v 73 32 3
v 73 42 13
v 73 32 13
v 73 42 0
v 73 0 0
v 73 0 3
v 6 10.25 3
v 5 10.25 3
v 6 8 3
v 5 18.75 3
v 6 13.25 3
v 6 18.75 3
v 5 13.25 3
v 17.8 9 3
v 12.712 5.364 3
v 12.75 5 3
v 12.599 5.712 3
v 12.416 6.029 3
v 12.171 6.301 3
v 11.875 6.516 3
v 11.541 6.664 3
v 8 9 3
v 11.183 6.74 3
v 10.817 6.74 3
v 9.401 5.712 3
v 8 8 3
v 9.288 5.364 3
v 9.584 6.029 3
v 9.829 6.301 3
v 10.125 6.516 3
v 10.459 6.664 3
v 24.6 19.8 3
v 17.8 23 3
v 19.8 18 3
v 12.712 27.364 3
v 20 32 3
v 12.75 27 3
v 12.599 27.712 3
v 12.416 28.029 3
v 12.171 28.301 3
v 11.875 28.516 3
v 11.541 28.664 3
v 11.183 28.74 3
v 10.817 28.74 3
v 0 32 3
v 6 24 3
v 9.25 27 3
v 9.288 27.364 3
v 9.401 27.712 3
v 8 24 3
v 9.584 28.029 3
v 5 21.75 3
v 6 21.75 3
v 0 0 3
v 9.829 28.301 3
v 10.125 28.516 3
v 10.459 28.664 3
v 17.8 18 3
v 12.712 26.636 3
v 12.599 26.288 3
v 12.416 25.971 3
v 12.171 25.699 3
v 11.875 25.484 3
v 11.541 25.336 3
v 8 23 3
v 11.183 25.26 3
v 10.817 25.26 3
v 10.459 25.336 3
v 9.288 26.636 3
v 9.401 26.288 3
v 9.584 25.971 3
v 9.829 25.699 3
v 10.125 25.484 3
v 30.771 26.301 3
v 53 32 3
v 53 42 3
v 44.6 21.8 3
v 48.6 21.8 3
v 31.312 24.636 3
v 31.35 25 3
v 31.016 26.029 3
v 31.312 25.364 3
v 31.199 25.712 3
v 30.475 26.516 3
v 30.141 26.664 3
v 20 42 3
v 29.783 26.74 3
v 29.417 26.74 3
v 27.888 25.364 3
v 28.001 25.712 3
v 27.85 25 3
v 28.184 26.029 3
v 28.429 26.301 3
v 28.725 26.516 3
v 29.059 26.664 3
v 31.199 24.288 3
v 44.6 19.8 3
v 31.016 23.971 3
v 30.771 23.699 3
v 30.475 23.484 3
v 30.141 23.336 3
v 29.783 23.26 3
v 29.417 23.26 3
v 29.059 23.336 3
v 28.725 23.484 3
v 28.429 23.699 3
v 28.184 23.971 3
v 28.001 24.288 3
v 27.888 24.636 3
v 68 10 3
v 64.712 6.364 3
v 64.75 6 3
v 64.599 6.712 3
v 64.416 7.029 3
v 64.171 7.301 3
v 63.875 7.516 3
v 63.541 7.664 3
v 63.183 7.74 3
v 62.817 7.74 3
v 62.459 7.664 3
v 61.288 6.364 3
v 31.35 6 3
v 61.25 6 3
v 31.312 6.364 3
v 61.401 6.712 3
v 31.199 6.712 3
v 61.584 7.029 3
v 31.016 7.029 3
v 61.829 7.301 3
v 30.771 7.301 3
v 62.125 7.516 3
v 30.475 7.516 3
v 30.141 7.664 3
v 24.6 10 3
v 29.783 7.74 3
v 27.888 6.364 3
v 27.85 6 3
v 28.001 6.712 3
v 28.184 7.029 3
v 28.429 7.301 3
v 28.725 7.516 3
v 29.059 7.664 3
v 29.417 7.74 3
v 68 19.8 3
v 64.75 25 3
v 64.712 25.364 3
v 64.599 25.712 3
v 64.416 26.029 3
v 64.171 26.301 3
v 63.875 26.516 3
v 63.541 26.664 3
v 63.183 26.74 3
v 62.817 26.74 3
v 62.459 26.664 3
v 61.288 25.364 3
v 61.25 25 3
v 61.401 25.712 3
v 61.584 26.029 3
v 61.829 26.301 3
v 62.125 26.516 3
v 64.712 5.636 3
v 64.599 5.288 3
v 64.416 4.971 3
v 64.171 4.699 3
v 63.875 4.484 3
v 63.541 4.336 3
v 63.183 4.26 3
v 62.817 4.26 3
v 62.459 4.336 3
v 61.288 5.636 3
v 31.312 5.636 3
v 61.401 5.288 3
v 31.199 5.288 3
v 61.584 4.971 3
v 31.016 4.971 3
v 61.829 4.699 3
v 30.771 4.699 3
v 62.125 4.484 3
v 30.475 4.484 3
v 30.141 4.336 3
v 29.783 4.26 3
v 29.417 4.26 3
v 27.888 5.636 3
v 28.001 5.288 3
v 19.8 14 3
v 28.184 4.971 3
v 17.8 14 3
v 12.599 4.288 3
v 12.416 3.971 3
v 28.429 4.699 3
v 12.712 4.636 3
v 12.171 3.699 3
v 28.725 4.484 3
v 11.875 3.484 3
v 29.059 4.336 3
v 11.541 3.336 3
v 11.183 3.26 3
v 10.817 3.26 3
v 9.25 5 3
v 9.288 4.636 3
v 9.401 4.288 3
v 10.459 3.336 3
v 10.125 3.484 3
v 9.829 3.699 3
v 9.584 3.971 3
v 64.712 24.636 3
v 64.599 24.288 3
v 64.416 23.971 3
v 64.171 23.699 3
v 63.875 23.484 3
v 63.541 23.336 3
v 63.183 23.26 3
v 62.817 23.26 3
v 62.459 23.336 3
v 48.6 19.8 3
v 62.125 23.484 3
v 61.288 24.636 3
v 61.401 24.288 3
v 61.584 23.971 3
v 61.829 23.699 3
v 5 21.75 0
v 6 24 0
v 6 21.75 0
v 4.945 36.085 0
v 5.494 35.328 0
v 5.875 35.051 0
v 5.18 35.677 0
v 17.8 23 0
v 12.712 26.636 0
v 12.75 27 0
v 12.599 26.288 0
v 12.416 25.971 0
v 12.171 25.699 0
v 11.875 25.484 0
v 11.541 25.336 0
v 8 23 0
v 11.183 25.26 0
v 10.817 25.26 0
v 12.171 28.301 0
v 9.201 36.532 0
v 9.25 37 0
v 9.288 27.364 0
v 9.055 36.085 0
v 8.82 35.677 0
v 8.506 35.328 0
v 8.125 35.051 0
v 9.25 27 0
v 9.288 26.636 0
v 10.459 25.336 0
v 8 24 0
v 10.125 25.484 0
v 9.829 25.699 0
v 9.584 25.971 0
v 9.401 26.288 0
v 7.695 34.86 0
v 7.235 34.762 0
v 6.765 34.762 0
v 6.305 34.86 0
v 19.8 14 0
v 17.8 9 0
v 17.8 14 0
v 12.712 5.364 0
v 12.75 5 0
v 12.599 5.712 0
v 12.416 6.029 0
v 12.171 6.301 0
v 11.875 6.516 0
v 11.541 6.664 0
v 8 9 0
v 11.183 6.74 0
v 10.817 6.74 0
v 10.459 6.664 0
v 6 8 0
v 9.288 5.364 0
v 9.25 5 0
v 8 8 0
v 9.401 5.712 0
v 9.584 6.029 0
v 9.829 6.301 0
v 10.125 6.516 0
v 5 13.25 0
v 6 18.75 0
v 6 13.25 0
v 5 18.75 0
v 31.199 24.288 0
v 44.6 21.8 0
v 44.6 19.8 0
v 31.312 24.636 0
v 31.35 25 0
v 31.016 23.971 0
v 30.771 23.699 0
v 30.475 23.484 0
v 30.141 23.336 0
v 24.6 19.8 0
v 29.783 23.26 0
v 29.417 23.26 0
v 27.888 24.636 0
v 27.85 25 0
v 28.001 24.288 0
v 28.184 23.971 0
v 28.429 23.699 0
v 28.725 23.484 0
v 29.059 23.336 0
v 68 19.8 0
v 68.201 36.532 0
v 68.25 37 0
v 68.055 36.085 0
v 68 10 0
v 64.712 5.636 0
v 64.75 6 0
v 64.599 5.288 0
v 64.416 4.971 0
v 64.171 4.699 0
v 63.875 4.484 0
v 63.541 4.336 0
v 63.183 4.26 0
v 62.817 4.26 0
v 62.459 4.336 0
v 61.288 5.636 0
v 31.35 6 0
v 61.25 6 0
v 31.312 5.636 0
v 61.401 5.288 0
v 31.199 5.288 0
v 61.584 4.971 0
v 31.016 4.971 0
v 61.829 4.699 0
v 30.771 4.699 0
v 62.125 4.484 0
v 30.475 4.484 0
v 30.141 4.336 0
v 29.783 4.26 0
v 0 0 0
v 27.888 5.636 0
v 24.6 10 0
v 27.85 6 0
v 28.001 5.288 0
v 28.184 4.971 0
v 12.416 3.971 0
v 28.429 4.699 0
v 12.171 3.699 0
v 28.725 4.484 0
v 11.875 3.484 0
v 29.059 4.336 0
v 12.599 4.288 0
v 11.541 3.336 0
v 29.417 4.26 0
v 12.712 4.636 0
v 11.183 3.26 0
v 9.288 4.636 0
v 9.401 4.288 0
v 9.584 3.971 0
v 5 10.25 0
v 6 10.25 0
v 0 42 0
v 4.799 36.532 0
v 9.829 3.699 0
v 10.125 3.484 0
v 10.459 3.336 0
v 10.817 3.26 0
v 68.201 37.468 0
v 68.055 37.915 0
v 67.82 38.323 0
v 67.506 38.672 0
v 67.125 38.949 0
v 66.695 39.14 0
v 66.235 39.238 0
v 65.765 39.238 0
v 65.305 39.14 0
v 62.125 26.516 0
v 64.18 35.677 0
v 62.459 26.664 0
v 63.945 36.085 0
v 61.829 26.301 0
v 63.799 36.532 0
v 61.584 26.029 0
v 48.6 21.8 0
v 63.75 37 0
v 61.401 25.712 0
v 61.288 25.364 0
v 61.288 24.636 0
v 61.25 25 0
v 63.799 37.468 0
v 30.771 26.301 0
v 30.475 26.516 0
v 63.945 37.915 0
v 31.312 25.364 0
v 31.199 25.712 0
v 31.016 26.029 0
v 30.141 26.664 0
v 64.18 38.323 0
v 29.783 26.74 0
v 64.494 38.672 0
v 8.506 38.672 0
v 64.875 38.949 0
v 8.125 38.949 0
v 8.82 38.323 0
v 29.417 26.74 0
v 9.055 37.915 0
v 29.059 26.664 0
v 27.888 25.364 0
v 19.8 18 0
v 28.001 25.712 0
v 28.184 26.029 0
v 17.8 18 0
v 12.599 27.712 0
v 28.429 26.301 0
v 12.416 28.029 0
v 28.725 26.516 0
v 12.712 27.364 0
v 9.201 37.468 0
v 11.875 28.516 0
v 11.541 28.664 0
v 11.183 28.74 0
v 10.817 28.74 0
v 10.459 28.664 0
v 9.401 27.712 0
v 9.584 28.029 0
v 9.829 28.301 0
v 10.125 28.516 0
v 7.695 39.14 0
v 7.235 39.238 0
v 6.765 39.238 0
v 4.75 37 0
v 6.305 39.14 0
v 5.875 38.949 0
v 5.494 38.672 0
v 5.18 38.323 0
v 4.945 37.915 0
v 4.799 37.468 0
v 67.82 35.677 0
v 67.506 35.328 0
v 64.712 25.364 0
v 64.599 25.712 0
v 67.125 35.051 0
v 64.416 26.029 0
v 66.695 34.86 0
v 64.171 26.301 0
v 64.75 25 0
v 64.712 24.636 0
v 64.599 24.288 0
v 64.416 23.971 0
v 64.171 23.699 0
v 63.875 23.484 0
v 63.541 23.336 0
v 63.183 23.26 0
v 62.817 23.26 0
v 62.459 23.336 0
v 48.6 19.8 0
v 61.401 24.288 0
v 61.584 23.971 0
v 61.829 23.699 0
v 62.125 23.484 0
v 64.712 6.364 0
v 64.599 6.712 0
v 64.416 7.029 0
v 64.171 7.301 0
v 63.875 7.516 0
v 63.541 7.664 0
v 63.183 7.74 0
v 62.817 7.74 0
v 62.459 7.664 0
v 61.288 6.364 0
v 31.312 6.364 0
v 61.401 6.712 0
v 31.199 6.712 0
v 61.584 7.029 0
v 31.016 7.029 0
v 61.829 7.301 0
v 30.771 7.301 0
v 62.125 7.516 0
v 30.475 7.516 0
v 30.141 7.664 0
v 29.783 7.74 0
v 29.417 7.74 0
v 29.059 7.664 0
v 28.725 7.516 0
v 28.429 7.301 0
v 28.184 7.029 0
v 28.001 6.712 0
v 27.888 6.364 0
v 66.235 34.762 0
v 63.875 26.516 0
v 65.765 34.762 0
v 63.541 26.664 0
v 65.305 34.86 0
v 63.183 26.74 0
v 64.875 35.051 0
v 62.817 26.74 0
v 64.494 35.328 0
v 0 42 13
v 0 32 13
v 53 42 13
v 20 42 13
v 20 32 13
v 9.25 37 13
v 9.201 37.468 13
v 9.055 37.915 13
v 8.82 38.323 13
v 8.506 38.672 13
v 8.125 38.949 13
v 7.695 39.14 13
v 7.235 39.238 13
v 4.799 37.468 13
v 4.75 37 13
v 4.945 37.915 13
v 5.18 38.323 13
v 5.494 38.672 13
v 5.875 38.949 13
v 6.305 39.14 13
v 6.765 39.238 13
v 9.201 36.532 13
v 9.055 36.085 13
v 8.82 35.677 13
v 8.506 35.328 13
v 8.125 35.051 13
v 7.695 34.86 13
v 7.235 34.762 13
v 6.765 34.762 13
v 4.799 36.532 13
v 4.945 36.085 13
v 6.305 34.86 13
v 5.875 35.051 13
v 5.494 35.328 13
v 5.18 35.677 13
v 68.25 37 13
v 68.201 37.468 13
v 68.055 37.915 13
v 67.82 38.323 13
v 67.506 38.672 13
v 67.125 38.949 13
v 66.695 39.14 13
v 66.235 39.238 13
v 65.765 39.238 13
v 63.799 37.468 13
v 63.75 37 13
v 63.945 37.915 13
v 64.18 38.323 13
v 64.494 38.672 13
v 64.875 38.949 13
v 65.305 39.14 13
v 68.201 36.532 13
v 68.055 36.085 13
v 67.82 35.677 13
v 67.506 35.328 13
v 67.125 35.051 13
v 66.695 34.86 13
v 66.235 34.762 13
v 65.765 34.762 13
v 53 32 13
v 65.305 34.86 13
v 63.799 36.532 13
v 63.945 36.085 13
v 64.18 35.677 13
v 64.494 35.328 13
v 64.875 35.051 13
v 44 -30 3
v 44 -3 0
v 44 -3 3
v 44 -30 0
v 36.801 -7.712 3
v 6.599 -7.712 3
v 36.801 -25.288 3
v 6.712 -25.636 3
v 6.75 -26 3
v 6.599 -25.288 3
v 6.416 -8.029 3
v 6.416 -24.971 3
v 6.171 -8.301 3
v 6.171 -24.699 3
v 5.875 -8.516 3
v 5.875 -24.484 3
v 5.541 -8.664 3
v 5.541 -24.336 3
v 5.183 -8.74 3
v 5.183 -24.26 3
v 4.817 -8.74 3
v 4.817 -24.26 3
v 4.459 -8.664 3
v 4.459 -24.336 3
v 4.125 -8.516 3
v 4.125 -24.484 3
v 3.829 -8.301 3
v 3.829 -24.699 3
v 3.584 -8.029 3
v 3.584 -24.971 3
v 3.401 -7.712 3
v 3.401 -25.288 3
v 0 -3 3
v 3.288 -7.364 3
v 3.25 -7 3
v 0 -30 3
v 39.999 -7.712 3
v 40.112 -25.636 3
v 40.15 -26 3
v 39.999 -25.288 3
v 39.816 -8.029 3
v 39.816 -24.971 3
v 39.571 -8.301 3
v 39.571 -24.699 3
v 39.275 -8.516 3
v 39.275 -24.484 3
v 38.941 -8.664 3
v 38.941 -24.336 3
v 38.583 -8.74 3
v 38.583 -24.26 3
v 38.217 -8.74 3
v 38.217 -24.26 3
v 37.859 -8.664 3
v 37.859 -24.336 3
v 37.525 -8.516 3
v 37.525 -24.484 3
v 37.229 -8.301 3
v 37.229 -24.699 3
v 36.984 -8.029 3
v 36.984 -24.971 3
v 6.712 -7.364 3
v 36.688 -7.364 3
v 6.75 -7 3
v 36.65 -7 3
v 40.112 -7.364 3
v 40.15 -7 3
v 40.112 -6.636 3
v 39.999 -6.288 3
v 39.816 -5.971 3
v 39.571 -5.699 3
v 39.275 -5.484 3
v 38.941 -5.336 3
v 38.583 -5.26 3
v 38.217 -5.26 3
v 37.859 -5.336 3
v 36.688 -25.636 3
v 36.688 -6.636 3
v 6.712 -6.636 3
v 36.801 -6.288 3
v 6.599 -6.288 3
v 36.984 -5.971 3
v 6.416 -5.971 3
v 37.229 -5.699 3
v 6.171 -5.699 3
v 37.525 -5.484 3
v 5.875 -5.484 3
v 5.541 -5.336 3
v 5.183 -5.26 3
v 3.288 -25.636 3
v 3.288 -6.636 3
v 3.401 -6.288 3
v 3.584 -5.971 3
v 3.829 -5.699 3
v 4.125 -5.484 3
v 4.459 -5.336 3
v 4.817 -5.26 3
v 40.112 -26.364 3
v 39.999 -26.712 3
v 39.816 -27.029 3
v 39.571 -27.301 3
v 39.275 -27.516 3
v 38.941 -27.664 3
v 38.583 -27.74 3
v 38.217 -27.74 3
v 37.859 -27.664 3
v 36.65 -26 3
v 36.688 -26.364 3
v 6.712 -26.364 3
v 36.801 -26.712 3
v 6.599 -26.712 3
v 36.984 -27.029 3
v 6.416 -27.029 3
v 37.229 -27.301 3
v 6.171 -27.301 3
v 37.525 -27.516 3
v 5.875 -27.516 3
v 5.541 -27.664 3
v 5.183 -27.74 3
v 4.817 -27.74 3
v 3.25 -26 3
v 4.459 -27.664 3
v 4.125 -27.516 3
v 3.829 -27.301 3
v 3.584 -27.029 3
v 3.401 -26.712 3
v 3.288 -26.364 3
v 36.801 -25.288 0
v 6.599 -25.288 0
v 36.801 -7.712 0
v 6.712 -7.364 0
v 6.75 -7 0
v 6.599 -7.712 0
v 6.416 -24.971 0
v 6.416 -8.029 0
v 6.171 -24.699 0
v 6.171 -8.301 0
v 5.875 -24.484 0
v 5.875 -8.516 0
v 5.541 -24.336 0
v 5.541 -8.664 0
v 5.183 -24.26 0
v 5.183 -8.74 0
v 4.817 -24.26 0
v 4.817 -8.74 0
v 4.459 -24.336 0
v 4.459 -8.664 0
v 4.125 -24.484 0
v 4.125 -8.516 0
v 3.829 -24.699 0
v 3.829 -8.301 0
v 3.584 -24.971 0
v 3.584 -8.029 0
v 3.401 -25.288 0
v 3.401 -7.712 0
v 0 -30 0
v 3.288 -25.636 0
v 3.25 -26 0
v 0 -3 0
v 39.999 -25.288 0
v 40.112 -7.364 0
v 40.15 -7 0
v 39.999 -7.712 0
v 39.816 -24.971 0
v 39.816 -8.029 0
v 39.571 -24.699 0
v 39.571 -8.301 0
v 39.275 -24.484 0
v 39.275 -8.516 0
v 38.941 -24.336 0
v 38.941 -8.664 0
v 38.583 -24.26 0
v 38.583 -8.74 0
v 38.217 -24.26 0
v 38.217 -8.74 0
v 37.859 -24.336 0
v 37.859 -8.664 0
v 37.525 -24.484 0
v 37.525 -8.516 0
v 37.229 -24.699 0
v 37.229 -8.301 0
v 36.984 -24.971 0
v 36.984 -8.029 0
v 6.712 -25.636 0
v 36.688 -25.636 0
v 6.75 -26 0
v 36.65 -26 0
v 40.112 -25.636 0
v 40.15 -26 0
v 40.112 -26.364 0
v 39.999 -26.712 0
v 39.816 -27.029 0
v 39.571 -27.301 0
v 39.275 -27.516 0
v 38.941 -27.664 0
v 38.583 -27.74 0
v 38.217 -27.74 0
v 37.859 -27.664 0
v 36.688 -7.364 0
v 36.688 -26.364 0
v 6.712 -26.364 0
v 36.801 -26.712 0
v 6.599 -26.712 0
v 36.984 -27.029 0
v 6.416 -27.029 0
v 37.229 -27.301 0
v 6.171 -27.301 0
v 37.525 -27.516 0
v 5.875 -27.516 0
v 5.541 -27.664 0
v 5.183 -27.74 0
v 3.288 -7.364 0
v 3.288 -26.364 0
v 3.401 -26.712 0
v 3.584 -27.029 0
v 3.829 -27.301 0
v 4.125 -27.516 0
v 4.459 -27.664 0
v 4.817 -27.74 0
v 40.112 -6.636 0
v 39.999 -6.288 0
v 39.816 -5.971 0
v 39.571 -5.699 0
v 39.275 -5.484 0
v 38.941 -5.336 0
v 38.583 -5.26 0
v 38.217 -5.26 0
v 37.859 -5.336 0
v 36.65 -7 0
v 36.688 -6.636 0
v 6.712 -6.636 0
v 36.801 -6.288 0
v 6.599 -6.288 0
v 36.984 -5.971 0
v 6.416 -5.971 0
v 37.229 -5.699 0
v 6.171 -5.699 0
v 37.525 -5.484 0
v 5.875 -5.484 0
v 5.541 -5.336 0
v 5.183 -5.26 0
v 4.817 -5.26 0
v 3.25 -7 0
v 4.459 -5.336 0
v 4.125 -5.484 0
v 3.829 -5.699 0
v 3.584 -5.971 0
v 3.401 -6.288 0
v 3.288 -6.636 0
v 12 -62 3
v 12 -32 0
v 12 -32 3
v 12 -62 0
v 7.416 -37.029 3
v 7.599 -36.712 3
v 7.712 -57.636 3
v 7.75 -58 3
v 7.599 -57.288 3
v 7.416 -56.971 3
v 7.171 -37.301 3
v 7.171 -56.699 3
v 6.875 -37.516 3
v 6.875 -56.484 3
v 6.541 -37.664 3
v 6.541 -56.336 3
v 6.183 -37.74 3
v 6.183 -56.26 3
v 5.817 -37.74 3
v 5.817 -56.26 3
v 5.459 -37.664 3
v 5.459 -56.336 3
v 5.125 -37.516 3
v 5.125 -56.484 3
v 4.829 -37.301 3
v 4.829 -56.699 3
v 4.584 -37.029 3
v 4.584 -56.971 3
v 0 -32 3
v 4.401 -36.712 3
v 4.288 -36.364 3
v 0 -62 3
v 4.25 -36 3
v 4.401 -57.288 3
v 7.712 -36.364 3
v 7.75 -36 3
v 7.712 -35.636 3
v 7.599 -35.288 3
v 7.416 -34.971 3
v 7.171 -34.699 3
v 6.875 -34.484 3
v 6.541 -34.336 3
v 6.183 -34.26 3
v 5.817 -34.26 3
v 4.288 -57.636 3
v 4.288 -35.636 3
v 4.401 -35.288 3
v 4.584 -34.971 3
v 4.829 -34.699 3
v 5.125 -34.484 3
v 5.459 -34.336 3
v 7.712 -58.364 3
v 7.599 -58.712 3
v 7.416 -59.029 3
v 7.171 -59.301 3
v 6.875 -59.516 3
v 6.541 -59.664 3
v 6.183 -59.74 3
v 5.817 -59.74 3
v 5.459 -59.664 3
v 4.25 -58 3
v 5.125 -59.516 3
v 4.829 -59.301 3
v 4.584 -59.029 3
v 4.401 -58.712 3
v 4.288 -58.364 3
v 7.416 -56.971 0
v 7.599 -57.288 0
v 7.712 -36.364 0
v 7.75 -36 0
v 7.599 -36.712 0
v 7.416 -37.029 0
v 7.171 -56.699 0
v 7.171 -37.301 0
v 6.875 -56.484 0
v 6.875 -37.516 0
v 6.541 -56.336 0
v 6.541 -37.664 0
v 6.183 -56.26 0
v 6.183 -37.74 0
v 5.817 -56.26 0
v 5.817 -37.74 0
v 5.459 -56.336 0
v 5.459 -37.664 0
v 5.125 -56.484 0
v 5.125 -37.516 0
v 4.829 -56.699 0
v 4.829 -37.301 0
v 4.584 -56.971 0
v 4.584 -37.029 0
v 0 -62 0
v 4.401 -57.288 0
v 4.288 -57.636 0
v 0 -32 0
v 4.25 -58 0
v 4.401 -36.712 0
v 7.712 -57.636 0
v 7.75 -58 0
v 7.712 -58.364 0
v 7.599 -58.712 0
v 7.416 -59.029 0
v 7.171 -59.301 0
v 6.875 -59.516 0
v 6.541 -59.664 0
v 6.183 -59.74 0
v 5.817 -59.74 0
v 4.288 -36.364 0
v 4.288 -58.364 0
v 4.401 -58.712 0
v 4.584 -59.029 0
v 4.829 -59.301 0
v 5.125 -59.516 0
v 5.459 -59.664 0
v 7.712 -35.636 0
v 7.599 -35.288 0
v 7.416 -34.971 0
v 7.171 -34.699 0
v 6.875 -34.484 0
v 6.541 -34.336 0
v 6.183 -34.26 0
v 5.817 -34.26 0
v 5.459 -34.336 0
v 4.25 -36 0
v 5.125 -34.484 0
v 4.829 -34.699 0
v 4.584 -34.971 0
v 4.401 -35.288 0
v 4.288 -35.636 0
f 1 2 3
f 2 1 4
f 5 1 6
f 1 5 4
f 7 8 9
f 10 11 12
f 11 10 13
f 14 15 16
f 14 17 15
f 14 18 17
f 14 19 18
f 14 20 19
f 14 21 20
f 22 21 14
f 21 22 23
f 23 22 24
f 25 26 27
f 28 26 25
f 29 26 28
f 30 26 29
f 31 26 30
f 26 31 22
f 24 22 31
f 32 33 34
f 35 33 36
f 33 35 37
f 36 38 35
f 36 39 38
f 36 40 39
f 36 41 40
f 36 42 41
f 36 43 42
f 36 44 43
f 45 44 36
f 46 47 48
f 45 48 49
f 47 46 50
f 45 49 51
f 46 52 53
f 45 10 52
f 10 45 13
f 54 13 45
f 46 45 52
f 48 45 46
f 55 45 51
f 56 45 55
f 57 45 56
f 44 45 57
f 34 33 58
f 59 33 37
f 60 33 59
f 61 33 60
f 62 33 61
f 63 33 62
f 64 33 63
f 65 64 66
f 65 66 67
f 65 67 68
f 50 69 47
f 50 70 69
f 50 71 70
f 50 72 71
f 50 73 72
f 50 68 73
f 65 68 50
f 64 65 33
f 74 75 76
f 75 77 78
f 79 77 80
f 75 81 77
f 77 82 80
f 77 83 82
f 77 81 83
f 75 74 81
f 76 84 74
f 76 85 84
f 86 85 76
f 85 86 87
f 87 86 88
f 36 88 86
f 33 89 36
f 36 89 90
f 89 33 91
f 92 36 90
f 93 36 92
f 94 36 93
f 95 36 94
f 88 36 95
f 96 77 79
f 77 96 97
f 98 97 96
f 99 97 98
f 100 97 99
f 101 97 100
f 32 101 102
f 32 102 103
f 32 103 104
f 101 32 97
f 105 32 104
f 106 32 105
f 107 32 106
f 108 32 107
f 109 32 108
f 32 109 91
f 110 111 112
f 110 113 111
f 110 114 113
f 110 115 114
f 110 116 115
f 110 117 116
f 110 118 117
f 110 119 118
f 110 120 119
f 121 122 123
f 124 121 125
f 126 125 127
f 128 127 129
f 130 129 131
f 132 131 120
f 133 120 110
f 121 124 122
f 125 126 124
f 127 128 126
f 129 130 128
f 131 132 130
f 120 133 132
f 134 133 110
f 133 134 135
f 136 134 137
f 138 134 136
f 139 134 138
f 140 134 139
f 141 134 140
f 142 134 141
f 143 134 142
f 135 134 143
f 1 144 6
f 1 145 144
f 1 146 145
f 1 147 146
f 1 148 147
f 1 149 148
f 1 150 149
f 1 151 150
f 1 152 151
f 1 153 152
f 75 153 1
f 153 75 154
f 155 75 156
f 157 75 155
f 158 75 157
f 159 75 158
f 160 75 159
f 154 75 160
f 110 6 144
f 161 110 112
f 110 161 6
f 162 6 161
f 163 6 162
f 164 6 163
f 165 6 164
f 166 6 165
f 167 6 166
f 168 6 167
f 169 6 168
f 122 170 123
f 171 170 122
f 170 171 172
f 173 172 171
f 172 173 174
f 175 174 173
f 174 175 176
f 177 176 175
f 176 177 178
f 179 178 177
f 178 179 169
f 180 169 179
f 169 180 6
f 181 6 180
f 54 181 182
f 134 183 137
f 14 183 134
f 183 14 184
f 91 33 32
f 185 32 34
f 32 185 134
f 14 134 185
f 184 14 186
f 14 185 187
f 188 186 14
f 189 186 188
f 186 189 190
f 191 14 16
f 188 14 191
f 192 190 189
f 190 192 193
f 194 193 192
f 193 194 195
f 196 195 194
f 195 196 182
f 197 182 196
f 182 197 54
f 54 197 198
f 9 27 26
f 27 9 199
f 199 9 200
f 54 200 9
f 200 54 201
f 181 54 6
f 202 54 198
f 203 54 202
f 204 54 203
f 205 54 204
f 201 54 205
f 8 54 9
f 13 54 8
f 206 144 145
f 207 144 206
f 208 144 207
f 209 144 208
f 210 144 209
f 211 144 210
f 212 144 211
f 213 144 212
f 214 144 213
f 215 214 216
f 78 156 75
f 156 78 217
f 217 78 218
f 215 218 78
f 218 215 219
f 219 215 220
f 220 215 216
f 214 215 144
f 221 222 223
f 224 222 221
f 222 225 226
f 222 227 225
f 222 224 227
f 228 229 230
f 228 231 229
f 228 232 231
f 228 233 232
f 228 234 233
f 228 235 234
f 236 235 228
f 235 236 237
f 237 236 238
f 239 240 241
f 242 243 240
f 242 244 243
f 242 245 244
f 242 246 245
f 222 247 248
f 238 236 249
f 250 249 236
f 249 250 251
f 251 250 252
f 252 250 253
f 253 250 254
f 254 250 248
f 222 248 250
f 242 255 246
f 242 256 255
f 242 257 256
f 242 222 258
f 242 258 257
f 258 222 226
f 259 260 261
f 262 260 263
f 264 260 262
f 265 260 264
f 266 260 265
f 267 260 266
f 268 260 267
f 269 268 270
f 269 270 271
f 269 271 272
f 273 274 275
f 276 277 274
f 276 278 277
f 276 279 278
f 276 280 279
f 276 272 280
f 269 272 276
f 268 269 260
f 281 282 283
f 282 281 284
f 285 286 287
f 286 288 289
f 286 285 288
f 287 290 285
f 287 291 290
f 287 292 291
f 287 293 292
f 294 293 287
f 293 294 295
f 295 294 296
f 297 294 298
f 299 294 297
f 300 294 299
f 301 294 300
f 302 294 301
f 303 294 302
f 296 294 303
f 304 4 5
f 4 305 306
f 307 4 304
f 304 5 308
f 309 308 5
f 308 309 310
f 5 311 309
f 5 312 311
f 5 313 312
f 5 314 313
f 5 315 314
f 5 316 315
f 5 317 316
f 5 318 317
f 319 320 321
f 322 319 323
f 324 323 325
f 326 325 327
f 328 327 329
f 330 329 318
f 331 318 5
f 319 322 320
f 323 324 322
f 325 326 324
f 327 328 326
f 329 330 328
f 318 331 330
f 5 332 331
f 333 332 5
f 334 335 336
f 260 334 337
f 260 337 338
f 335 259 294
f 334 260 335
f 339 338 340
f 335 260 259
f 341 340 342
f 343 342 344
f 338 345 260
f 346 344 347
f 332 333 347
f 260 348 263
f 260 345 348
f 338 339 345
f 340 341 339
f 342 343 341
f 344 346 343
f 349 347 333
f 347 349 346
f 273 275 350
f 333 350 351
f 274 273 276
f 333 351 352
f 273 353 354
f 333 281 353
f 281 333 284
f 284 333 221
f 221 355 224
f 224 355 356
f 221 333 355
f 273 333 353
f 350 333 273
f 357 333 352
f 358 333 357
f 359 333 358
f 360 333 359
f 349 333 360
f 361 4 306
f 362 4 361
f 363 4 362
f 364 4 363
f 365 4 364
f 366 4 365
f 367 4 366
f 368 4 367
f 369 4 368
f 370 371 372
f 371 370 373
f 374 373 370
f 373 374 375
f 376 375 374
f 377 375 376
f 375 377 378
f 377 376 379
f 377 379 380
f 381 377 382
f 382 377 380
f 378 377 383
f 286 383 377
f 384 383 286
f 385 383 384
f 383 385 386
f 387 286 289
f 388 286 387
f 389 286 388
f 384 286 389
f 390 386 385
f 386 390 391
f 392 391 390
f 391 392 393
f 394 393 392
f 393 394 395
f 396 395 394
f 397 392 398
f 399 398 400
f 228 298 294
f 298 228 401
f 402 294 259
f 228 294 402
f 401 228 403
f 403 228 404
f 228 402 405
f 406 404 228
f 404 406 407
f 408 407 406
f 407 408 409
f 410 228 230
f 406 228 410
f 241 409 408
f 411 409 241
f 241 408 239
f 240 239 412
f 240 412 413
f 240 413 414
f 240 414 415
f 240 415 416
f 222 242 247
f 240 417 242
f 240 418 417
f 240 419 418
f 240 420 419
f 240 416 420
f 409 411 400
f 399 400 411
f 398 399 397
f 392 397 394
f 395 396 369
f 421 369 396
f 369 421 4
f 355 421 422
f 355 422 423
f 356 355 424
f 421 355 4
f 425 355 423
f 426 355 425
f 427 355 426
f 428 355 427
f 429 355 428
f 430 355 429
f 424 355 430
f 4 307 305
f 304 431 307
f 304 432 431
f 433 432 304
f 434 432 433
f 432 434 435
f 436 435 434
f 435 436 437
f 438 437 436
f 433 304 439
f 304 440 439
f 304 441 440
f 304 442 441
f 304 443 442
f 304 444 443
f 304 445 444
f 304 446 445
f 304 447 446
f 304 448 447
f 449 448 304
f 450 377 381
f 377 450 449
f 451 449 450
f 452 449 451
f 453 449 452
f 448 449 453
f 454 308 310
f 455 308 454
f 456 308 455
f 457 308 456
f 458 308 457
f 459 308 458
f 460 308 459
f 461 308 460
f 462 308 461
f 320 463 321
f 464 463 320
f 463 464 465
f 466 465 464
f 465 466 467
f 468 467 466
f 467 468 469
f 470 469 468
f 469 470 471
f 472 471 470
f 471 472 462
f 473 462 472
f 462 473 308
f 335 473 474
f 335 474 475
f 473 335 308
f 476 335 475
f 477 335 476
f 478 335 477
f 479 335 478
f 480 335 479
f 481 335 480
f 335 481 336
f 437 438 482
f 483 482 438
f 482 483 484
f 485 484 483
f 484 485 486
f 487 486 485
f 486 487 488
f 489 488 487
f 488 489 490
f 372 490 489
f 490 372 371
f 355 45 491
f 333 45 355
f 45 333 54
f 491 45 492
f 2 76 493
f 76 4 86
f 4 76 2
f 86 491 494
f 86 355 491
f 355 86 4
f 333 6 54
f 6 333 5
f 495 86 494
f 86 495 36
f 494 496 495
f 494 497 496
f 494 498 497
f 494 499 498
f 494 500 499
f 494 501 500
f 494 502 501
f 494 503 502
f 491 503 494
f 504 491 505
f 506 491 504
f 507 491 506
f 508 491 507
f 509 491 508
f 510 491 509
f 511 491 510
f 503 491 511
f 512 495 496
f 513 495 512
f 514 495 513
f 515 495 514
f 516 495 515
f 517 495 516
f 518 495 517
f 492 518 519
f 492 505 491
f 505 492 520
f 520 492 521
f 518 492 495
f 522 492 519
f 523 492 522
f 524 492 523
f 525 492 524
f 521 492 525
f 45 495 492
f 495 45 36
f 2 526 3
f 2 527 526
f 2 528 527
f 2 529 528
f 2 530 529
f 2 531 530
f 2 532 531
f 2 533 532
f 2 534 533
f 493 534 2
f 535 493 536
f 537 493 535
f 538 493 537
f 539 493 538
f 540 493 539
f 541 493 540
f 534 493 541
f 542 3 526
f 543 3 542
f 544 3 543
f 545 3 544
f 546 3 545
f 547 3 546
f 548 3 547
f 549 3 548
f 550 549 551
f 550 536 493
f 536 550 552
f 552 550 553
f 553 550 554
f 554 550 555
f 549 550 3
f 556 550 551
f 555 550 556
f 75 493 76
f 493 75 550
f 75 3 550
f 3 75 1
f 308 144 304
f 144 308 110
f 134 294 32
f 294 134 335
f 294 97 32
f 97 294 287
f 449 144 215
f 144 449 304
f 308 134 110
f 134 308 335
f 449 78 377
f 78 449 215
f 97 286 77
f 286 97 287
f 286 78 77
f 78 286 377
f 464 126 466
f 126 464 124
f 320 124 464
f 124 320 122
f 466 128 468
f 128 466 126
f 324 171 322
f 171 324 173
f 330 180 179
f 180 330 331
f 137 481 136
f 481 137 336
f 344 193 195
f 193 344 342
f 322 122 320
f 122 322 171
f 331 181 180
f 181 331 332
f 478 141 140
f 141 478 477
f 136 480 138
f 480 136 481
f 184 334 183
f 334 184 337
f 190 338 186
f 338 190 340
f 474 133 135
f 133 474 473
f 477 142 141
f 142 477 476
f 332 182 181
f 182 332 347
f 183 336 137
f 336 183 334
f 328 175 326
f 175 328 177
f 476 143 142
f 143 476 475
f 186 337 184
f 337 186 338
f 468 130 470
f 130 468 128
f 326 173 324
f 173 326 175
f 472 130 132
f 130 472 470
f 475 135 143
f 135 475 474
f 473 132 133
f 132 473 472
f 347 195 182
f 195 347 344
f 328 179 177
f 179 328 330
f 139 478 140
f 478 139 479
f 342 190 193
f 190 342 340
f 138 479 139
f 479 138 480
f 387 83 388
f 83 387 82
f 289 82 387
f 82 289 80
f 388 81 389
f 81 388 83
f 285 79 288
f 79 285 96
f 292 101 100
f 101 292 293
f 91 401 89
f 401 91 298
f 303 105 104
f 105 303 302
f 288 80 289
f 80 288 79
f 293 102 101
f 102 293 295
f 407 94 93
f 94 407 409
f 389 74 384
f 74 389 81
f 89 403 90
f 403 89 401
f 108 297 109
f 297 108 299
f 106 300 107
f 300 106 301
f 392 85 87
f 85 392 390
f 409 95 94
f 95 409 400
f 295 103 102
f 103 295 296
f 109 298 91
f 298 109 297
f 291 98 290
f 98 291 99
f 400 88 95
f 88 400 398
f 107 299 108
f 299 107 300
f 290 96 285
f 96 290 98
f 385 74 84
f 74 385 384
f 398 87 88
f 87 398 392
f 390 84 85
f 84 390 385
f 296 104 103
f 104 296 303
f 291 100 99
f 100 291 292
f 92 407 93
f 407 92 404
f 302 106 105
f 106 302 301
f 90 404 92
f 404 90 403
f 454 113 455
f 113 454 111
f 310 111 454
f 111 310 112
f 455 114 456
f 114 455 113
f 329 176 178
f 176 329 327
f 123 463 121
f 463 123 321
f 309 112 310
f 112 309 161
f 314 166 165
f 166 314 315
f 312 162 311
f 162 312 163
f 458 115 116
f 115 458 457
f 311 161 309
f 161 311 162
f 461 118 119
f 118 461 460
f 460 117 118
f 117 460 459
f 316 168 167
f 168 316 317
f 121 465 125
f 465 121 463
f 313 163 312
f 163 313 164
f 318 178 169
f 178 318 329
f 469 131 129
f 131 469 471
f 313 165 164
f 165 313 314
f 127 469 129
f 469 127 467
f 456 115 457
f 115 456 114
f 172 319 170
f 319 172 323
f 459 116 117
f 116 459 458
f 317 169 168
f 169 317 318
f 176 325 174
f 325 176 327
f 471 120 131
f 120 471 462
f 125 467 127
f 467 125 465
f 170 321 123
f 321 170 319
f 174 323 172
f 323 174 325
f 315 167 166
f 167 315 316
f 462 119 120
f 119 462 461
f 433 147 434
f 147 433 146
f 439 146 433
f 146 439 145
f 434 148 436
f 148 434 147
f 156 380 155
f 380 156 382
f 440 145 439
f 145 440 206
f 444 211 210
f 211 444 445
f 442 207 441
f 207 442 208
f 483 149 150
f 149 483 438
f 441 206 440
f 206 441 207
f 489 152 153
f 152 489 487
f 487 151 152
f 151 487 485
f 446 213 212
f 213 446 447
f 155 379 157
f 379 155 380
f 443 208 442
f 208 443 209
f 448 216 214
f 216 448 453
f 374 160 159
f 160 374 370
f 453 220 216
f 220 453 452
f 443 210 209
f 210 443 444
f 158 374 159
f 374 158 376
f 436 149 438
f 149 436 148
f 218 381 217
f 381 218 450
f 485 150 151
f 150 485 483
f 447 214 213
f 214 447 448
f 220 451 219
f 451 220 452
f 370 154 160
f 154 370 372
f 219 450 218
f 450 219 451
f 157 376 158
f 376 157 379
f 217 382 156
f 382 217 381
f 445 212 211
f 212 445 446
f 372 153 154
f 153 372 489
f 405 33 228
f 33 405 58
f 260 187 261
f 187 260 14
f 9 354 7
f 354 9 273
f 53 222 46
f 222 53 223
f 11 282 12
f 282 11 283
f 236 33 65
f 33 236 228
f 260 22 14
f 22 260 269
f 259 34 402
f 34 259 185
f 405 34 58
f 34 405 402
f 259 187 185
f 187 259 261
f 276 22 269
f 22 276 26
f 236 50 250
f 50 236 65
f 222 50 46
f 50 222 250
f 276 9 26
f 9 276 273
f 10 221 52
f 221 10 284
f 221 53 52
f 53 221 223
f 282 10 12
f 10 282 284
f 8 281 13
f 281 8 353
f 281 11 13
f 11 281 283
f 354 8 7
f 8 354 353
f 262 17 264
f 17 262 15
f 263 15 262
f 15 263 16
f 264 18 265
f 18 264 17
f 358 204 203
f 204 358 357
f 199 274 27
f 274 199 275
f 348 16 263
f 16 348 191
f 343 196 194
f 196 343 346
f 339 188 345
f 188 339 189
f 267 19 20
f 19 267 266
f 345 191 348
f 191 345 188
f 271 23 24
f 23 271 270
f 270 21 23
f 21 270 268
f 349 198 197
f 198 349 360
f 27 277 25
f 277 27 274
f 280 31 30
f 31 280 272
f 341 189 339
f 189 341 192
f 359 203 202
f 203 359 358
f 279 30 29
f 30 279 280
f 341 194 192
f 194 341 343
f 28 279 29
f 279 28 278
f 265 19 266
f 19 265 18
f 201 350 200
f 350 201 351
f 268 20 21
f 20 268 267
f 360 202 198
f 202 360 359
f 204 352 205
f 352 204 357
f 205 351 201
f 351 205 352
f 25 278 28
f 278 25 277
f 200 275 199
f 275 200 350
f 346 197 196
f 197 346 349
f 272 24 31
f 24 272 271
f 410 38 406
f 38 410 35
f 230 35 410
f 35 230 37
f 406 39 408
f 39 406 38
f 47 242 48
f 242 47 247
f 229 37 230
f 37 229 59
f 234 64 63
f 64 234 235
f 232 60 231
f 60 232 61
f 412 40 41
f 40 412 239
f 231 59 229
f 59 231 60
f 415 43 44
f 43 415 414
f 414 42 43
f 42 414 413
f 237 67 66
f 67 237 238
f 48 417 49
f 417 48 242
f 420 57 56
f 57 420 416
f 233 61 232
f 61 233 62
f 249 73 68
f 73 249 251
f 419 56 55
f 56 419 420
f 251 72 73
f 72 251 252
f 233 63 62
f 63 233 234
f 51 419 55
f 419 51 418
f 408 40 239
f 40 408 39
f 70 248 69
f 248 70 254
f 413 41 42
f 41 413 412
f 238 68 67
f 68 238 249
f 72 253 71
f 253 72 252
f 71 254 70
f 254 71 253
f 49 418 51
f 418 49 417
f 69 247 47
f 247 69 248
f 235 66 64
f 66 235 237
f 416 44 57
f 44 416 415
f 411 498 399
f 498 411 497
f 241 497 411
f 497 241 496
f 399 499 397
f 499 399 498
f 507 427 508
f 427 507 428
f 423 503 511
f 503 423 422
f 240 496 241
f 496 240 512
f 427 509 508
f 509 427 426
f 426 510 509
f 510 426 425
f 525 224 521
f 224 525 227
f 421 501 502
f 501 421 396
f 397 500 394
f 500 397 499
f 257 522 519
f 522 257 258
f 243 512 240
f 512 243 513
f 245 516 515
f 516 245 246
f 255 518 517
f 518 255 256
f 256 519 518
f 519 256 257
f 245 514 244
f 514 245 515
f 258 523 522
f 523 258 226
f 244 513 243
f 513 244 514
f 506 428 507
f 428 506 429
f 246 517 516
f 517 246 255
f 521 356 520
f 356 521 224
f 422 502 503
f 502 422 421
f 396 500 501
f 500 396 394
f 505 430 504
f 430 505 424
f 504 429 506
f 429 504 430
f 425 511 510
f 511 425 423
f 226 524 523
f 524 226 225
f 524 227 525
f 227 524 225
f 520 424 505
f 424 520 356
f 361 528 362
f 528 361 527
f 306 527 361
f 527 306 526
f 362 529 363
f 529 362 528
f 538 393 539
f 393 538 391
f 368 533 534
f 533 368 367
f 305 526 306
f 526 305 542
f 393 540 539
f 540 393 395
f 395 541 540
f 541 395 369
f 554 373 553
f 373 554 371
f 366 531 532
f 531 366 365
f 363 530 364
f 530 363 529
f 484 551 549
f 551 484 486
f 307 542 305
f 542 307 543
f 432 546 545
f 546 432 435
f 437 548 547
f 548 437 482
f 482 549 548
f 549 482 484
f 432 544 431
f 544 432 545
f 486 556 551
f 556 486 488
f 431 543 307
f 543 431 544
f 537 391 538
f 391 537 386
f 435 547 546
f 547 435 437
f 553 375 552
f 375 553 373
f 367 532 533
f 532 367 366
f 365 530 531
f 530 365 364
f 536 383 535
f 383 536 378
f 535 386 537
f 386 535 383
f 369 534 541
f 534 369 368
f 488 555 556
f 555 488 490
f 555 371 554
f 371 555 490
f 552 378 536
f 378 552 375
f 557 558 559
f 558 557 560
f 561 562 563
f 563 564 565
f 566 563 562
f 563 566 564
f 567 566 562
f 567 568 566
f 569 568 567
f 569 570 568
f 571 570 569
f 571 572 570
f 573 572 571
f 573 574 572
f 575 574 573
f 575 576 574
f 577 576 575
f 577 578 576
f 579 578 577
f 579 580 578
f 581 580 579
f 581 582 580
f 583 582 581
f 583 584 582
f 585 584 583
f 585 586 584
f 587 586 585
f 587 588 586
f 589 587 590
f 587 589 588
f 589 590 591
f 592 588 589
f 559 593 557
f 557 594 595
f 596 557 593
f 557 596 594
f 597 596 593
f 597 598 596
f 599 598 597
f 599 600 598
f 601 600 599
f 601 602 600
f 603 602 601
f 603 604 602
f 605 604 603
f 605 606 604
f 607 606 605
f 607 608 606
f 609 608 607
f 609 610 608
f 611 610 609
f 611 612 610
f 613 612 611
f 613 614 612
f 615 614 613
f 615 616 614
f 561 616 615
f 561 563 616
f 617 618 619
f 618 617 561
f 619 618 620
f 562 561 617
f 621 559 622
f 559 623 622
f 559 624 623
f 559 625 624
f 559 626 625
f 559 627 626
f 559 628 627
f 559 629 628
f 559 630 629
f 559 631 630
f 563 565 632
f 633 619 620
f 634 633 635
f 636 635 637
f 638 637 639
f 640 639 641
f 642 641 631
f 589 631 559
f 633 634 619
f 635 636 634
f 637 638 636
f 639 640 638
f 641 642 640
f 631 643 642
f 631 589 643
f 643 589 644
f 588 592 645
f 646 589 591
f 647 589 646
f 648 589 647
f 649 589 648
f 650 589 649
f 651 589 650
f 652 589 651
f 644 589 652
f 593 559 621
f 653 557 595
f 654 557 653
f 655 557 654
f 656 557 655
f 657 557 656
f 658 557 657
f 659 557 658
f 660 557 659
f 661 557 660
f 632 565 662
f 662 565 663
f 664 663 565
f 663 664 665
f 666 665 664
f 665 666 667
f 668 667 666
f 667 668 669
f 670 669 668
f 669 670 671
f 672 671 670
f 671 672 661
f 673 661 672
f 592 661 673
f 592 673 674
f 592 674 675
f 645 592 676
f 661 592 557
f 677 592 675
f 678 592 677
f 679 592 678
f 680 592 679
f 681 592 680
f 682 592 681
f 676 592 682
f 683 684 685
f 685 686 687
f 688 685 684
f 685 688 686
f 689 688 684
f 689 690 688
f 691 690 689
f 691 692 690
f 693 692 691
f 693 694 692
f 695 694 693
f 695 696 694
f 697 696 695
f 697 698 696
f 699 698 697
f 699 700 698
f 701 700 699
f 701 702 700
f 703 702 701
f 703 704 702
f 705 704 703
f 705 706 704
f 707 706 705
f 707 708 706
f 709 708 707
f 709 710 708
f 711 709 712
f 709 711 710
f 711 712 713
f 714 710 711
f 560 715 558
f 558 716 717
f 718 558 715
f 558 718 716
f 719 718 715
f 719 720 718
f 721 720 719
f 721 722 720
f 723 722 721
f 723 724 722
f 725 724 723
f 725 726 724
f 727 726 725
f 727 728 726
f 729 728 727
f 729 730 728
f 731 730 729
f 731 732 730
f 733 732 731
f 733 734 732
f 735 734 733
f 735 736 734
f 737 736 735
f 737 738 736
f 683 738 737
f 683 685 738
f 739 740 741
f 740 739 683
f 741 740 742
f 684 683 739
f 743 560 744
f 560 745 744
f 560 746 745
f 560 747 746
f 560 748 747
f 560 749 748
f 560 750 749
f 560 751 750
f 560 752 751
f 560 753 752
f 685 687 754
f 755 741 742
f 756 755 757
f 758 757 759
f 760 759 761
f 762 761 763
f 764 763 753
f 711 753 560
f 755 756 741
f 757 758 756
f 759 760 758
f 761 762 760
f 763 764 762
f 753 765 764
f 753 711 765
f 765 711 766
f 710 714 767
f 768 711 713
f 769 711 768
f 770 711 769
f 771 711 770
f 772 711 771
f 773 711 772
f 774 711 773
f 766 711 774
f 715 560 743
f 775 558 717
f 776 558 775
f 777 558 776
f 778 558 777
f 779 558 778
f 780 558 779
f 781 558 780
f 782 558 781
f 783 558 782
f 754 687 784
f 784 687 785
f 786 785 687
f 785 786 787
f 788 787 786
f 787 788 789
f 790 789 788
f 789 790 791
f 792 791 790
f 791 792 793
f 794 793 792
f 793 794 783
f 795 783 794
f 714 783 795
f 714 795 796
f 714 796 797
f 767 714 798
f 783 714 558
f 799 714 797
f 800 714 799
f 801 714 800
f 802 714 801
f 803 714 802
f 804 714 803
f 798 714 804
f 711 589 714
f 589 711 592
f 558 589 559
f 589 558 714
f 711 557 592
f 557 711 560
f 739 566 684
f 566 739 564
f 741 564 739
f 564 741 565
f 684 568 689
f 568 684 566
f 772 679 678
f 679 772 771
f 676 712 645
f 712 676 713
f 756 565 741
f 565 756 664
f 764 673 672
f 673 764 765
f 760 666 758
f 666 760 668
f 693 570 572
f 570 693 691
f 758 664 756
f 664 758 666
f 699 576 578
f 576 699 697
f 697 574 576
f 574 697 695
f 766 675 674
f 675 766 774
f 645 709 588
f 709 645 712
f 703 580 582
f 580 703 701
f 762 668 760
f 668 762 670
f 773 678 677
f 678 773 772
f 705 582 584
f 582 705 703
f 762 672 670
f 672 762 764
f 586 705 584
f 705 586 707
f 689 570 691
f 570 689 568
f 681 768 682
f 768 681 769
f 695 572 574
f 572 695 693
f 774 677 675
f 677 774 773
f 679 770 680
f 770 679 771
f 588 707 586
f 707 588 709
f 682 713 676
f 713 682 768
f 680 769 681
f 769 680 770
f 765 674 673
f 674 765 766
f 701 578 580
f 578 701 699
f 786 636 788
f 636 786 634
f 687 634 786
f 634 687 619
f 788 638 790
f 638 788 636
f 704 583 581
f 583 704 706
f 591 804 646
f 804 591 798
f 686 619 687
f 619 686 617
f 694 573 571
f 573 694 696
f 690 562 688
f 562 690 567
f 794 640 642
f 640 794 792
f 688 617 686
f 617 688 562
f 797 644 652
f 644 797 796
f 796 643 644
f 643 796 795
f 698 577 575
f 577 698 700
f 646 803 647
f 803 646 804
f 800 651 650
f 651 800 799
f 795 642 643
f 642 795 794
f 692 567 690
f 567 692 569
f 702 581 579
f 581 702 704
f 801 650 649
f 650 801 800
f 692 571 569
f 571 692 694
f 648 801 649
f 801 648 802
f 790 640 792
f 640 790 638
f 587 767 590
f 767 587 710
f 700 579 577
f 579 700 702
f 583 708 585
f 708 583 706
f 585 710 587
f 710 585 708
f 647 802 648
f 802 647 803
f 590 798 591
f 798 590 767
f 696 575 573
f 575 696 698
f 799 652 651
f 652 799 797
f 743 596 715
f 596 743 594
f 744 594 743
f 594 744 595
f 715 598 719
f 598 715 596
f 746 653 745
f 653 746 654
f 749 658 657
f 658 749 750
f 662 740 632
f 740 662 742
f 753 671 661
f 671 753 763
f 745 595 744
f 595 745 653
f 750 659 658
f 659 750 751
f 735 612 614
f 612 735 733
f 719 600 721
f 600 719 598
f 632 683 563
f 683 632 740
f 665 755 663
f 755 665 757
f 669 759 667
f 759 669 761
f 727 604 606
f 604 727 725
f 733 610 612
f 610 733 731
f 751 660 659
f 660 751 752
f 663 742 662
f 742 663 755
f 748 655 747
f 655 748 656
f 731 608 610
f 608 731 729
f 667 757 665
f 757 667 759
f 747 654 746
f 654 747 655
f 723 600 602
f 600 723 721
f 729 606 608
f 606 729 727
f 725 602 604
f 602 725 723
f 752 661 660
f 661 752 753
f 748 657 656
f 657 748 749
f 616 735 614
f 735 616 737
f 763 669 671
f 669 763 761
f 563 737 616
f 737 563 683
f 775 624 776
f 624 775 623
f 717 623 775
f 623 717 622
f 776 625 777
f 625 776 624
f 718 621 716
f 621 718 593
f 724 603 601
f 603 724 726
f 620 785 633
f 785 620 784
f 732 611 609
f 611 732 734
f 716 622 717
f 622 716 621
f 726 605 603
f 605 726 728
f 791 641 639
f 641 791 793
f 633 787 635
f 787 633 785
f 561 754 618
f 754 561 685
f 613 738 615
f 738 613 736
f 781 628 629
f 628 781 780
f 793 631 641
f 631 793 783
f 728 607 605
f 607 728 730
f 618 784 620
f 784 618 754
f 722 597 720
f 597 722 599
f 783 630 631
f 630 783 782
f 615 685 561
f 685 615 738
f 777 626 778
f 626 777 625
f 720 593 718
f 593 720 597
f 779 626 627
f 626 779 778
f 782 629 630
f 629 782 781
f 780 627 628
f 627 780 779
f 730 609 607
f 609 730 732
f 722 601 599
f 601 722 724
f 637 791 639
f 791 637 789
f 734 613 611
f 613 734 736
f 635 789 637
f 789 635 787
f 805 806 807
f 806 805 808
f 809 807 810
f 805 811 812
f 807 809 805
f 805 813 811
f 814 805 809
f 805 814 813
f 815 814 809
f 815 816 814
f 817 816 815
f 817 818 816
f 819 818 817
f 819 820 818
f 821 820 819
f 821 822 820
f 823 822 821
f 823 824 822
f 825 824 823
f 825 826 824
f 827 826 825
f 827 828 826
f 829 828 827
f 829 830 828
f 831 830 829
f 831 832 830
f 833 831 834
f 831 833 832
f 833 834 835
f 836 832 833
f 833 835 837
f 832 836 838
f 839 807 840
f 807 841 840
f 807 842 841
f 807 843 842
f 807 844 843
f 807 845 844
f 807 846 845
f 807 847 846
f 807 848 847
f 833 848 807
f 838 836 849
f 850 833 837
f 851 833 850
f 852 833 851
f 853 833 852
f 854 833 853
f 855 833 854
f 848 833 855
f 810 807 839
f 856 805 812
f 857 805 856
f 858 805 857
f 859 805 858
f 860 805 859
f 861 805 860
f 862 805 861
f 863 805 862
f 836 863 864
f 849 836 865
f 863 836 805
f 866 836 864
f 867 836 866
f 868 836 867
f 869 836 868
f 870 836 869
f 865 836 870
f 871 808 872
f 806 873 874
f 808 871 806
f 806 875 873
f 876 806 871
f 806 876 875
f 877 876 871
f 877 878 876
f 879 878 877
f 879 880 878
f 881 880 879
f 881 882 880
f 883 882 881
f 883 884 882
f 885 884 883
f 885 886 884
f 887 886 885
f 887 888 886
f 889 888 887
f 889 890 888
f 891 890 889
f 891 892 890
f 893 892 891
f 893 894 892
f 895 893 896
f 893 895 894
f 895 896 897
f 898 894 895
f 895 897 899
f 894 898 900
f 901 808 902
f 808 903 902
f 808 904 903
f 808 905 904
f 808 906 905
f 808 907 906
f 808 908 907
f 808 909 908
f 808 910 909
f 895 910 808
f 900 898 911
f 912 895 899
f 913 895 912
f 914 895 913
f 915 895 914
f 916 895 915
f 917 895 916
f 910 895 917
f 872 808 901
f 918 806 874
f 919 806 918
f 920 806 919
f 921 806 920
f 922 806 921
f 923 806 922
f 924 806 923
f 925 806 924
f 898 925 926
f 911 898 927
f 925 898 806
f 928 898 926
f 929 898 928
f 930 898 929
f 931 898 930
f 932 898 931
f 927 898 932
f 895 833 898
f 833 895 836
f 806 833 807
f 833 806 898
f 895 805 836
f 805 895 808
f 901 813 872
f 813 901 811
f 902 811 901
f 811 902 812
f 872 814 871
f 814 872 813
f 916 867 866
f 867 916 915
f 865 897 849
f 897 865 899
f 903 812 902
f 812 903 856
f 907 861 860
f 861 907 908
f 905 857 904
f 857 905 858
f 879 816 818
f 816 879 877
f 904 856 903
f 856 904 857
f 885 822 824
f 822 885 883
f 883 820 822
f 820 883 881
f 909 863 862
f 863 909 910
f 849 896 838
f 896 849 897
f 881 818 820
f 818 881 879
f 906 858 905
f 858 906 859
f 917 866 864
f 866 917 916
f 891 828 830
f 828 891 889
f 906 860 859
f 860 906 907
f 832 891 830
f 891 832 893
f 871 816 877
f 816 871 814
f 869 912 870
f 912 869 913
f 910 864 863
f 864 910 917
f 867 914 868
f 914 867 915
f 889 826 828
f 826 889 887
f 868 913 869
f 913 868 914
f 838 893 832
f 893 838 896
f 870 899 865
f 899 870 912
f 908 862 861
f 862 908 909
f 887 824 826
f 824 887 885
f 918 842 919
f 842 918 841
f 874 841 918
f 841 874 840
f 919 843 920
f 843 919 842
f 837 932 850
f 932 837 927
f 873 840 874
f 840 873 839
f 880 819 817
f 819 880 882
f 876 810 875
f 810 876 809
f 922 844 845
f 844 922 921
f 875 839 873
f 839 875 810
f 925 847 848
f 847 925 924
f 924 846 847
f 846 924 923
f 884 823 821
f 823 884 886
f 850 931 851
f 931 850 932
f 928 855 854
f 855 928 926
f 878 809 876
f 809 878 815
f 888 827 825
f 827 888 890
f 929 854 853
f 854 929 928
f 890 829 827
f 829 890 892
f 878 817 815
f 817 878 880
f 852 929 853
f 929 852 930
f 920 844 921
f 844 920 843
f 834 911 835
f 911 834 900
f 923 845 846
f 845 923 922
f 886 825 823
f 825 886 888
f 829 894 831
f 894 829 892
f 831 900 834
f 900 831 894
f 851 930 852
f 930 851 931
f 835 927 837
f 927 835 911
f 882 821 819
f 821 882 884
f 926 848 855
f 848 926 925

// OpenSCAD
ATX_connector_offset = 24.6;
GPU_connector_offset = 5;

module plate() {
    cube([73, 42, 3]);
    translate([0,32,3]) cube([20, 10, 10]);
    translate([53,32,3]) cube([20, 10, 10]);
}

module back_plate_ATX() {
    difference() {
        cube([44, 27, 3]);
        translate([5, 4, -1]) cylinder(d=3.5, h=5, $fn=30);
        translate([5, 23, -1]) cylinder(d=3.5, h=5, $fn=30);

        translate([38.4, 4, -1]) cylinder(d=3.5, h=5, $fn=30);
        translate([38.4, 23, -1]) cylinder(d=3.5, h=5, $fn=30);
    }
}

module back_plate_GPU() {
    difference() {
        cube([12, 30, 3]);
        translate([6, 4, -1]) cylinder(d=3.5, h=5, $fn=30);
        translate([6, 26, -1]) cylinder(d=3.5, h=5, $fn=30);
    }
}

module plate_with_holes() {
    difference() {
    
        plate();
        
        // ATX
        translate([ATX_connector_offset,10,-1]) cube([43.4, 9.8, 5]);
        translate([ATX_connector_offset+20,19.8,-1]) cube([4, 2, 5]);

        translate([ATX_connector_offset+5, 6, -1]) cylinder(d=3.5, h=5, $fn=30);
        translate([ATX_connector_offset+5, 25, -1]) cylinder(d=3.5, h=5, $fn=30);

        translate([ATX_connector_offset+38.4, 6, -1]) cylinder(d=3.5, h=5, $fn=30);
        translate([ATX_connector_offset+38.4, 25, -1]) cylinder(d=3.5, h=5, $fn=30);

        // GPU
        translate([GPU_connector_offset+1,9,-1]) cube([11.8, 14, 5]);
        translate([GPU_connector_offset+12.8,14,-1]) cube([2, 4, 5]);
        translate([GPU_connector_offset+1,8,-1]) cube([2, 16, 5]);
        translate([GPU_connector_offset,18.75,-1]) cube([2, 3, 5]);
        translate([GPU_connector_offset,10.25,-1]) cube([2, 3, 5]);
        
        translate([GPU_connector_offset+6, 5, -1]) cylinder(d=3.5, h=5, $fn=30);
        translate([GPU_connector_offset+6, 27, -1]) cylinder(d=3.5, h=5, $fn=30);
        
        // mount holes
        translate([7, 37, -1]) cylinder(d=4.5, h=15, $fn=30);
        translate([66, 37, -1]) cylinder(d=4.5, h=15, $fn=30);
    }
}

module power_connectors() {
    plate_with_holes();
    translate([0,-30,0]) back_plate_ATX();
    translate([0,-62,0]) back_plate_GPU();
}

power_connectors();
